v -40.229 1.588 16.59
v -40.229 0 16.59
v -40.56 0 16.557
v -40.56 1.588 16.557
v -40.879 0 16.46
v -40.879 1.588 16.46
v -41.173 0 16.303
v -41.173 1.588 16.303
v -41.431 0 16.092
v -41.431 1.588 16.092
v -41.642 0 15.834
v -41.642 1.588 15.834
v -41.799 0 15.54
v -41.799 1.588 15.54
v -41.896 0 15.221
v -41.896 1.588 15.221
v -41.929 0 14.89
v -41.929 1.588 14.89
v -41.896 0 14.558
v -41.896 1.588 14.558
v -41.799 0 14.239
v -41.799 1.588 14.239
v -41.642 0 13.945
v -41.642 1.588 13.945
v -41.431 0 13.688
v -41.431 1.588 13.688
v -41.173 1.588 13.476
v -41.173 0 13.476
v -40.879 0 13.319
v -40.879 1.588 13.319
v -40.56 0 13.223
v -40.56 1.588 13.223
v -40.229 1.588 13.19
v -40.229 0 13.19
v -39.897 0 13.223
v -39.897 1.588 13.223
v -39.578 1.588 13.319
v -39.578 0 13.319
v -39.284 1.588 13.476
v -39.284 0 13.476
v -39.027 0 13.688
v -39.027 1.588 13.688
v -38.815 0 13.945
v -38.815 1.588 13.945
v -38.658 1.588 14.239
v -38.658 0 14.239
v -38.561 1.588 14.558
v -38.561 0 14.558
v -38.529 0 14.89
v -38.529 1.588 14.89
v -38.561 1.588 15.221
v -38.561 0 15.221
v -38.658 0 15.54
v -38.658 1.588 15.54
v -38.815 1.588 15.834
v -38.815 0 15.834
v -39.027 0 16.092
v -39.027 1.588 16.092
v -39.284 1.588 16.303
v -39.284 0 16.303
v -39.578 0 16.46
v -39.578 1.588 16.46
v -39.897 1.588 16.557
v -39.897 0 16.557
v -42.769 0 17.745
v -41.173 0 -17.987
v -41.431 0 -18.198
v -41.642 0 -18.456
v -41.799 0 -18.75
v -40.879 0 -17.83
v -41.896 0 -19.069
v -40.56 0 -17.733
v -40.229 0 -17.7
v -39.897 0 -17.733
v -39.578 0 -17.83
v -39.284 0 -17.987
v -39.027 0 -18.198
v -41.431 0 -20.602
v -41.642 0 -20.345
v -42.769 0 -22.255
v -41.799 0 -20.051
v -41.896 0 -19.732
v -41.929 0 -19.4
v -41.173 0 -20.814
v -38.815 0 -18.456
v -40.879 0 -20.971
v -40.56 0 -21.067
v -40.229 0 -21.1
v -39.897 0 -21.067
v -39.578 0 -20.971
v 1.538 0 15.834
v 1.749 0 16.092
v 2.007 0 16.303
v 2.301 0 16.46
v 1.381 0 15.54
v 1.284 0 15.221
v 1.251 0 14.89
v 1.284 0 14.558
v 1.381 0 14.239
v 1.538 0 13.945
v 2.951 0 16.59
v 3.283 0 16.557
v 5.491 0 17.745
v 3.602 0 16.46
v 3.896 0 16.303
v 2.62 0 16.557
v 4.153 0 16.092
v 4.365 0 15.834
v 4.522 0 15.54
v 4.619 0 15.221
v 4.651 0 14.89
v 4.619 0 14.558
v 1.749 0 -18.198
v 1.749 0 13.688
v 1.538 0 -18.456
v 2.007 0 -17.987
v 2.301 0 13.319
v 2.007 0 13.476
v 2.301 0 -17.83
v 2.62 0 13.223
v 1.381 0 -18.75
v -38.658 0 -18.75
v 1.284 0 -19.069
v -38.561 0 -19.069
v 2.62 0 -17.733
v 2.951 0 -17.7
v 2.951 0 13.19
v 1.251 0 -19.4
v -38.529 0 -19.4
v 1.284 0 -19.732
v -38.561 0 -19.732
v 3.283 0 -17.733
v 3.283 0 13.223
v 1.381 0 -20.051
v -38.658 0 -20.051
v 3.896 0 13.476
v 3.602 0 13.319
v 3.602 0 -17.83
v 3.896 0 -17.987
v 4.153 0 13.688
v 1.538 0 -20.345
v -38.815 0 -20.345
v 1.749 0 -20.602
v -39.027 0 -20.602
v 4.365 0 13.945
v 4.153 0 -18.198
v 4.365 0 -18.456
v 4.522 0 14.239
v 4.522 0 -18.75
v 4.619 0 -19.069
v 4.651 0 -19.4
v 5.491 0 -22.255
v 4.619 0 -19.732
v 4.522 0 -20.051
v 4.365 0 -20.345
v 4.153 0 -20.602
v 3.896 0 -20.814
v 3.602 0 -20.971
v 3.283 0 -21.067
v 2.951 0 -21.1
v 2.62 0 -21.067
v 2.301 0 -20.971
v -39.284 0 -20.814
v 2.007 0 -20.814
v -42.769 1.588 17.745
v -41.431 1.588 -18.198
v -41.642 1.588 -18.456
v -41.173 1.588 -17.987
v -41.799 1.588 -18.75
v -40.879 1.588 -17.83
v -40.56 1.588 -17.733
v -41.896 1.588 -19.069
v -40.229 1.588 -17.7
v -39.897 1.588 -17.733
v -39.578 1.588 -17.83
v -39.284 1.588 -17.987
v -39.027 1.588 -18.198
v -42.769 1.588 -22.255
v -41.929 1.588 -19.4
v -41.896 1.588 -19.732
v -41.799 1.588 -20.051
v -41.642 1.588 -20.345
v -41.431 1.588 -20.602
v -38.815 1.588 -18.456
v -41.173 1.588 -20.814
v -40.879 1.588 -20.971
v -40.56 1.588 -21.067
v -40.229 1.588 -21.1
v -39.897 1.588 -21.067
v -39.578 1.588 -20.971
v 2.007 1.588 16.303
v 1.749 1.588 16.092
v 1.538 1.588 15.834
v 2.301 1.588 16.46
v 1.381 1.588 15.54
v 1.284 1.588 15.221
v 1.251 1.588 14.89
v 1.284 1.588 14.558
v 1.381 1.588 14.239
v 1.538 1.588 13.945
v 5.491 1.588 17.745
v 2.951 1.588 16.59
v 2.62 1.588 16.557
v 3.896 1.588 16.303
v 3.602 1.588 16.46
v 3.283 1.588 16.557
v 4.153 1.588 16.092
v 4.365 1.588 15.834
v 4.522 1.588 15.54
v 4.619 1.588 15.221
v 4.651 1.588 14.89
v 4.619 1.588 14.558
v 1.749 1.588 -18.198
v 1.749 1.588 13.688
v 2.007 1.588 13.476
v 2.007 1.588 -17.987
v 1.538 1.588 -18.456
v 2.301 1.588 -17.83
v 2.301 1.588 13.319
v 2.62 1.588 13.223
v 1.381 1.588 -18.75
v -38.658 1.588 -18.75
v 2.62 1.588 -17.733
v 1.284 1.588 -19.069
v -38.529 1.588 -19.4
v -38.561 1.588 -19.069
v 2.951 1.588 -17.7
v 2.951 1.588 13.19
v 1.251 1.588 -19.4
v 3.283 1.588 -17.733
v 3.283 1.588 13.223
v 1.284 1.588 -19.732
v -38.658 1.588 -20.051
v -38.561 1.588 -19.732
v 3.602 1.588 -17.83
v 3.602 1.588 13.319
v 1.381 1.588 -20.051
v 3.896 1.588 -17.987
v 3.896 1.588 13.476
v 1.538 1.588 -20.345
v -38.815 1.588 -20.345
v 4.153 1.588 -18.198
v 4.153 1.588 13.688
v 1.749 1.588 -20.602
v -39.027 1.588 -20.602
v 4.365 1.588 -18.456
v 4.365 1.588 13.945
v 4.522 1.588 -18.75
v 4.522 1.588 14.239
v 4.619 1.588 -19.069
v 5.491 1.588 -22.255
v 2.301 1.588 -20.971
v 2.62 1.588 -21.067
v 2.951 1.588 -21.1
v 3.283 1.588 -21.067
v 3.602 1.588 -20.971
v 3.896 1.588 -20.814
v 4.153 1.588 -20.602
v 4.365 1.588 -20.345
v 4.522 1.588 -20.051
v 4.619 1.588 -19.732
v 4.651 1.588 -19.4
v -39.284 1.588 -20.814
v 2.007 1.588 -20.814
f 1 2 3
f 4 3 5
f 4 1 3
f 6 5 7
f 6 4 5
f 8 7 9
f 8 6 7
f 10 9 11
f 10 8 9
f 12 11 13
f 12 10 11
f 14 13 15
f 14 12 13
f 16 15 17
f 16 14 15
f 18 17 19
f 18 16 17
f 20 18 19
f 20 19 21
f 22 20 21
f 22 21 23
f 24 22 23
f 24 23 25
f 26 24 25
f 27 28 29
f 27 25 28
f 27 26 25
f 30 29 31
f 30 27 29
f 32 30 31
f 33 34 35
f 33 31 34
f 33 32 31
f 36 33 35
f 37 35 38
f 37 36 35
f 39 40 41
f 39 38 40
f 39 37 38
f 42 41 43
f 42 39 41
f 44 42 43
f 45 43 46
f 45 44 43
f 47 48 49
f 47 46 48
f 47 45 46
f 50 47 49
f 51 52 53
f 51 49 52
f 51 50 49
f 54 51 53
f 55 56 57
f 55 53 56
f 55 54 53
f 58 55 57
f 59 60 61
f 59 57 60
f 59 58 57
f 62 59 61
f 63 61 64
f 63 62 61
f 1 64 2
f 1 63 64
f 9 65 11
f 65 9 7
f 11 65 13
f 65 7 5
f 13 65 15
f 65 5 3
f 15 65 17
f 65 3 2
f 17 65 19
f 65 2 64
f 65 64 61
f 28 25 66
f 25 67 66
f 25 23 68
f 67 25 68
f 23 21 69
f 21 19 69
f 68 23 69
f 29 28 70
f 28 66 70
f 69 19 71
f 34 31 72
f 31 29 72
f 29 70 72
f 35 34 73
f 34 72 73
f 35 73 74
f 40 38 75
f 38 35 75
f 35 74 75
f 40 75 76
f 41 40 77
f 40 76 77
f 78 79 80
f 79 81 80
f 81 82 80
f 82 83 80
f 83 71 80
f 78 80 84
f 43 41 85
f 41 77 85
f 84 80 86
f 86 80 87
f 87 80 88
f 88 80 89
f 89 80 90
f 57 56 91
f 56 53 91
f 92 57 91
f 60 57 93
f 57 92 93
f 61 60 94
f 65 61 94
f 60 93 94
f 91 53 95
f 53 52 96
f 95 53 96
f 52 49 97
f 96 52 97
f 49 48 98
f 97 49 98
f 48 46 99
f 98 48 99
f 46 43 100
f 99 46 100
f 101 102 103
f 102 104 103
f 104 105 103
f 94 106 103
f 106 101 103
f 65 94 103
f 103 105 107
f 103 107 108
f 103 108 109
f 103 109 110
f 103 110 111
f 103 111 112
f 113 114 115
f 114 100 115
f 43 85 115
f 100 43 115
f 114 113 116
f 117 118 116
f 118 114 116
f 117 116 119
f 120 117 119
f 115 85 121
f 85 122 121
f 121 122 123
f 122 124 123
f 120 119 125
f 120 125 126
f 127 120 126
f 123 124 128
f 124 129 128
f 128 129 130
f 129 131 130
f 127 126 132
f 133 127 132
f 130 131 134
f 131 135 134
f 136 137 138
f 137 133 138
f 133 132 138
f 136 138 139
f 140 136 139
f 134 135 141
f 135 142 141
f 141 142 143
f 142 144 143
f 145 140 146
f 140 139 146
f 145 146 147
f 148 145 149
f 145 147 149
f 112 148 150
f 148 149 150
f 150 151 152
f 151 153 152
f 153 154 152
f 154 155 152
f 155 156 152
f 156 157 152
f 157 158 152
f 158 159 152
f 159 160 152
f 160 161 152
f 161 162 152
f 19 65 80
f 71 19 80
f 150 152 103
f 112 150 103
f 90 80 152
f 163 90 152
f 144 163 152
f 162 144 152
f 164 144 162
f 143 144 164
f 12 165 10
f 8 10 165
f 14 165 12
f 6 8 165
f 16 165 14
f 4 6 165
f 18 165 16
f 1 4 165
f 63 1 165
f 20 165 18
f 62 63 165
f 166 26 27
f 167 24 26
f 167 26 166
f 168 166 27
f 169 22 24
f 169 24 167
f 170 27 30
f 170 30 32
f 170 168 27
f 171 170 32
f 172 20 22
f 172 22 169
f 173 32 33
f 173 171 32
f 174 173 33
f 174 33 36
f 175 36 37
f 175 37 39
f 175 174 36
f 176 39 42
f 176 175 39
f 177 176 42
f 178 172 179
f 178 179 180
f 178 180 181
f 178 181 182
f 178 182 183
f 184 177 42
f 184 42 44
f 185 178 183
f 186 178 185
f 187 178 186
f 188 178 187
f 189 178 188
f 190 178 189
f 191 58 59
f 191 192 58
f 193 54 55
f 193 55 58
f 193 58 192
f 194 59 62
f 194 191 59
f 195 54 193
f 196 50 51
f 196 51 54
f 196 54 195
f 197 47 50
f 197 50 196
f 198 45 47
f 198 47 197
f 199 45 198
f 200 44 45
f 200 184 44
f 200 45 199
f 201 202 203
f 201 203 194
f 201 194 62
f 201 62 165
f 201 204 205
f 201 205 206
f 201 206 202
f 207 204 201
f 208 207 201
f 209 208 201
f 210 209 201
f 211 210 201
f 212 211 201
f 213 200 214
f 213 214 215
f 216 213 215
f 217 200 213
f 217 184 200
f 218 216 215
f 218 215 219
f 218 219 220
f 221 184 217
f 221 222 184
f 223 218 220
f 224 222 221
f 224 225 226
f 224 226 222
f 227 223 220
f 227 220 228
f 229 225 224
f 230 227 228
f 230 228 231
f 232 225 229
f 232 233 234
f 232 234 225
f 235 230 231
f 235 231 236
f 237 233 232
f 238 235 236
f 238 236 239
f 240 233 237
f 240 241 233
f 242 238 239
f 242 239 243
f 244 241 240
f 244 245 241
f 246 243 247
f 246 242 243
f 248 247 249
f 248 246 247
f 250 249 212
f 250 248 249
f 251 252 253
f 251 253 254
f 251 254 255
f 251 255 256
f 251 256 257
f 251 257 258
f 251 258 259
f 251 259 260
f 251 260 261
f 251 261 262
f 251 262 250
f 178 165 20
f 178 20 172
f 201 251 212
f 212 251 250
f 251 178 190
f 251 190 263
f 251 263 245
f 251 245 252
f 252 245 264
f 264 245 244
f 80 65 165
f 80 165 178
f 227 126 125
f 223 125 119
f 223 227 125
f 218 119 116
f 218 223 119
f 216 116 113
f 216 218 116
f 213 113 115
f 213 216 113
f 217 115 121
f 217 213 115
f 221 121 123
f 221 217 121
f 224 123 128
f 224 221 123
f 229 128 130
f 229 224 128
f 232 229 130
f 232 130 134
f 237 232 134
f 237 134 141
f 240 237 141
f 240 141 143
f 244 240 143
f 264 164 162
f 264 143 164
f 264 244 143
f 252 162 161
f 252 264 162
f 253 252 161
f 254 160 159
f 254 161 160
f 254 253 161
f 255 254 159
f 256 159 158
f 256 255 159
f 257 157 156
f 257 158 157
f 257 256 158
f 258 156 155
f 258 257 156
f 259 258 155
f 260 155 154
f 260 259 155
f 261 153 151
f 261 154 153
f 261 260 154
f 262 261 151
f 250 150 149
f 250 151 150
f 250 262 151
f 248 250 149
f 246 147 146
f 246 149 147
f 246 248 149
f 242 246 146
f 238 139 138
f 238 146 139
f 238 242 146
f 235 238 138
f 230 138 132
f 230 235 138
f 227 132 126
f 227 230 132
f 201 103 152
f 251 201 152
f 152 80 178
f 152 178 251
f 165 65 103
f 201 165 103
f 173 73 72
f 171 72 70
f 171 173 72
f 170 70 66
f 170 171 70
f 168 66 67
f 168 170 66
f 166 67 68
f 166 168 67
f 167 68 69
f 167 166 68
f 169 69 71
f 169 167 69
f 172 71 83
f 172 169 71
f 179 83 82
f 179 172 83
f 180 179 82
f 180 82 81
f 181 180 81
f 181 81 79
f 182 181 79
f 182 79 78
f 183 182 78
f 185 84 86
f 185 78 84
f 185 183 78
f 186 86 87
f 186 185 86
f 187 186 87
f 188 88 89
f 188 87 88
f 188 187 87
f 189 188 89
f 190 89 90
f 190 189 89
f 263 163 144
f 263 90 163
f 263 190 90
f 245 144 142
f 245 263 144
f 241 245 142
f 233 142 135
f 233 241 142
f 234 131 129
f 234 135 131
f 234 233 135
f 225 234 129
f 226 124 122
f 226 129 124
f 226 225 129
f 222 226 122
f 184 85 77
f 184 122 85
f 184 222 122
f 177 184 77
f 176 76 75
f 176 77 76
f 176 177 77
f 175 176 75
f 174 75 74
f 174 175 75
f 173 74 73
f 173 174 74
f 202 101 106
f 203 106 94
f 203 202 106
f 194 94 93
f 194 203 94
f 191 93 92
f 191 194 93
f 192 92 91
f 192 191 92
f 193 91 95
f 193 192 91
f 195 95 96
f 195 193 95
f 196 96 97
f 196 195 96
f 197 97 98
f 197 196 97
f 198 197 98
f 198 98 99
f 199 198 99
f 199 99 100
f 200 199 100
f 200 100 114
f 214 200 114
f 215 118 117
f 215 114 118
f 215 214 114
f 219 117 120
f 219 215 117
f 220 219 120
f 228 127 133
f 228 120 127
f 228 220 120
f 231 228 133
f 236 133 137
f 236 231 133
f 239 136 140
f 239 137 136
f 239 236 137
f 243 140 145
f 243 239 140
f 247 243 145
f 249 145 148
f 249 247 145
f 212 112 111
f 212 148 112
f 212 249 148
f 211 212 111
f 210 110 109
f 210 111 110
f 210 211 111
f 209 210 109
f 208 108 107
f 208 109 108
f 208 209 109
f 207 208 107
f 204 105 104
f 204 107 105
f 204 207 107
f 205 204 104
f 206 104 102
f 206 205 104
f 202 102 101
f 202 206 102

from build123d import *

# Parameters (mm, degrees)
SKETCH1_W            = 48.26
SKETCH1_H            = 40
BOSS_EXTRUDE1_DEPTH  = 1.5875
LPATTERN1_COUNT      = 2
LPATTERN1_PITCH      = 43.18
LPATTERN1_COUNT_DIR2 = 2
LPATTERN1_PITCH_DIR2 = 34.29


with BuildPart() as part:
    # Sketch1 → Boss-Extrude1 (new body)
    with BuildSketch(Plane(origin=(0, 0, 0), x_dir=(1, 0, 0), z_dir=(0, 1, 0))):
        with Locations((-18.638619051, 2.255163759)):
            Rectangle(SKETCH1_W, SKETCH1_H)
    extrude(amount=BOSS_EXTRUDE1_DEPTH)

    # Sketch9 → Clearance hole for 3MM screw (revolve, cut)
    with BuildSketch(Plane(origin=(-40.228619051, 1.5875, -19.400163759), x_dir=(0, 0, 1), z_dir=(1, 0, 0))):
        Polygon((0, 0), (0, 13.721463052), (1.7, 12.7), (1.7, 0), align=None)
    clearance_hole_for_3mm_screw = revolve(axis=Axis((-40.228619051, 7.9375, -19.400163759), (0, -1, 0)), mode=Mode.SUBTRACT)

    # LPattern1: Clearance hole for 3MM screw 2 × 2
    with Locations(*[(i * LPATTERN1_PITCH, 0, j * LPATTERN1_PITCH_DIR2) for i in range(LPATTERN1_COUNT) for j in range(LPATTERN1_COUNT_DIR2) if (i, j) != (0, 0)]):
        add(clearance_hole_for_3mm_screw, mode=Mode.SUBTRACT)


solid = part.part
